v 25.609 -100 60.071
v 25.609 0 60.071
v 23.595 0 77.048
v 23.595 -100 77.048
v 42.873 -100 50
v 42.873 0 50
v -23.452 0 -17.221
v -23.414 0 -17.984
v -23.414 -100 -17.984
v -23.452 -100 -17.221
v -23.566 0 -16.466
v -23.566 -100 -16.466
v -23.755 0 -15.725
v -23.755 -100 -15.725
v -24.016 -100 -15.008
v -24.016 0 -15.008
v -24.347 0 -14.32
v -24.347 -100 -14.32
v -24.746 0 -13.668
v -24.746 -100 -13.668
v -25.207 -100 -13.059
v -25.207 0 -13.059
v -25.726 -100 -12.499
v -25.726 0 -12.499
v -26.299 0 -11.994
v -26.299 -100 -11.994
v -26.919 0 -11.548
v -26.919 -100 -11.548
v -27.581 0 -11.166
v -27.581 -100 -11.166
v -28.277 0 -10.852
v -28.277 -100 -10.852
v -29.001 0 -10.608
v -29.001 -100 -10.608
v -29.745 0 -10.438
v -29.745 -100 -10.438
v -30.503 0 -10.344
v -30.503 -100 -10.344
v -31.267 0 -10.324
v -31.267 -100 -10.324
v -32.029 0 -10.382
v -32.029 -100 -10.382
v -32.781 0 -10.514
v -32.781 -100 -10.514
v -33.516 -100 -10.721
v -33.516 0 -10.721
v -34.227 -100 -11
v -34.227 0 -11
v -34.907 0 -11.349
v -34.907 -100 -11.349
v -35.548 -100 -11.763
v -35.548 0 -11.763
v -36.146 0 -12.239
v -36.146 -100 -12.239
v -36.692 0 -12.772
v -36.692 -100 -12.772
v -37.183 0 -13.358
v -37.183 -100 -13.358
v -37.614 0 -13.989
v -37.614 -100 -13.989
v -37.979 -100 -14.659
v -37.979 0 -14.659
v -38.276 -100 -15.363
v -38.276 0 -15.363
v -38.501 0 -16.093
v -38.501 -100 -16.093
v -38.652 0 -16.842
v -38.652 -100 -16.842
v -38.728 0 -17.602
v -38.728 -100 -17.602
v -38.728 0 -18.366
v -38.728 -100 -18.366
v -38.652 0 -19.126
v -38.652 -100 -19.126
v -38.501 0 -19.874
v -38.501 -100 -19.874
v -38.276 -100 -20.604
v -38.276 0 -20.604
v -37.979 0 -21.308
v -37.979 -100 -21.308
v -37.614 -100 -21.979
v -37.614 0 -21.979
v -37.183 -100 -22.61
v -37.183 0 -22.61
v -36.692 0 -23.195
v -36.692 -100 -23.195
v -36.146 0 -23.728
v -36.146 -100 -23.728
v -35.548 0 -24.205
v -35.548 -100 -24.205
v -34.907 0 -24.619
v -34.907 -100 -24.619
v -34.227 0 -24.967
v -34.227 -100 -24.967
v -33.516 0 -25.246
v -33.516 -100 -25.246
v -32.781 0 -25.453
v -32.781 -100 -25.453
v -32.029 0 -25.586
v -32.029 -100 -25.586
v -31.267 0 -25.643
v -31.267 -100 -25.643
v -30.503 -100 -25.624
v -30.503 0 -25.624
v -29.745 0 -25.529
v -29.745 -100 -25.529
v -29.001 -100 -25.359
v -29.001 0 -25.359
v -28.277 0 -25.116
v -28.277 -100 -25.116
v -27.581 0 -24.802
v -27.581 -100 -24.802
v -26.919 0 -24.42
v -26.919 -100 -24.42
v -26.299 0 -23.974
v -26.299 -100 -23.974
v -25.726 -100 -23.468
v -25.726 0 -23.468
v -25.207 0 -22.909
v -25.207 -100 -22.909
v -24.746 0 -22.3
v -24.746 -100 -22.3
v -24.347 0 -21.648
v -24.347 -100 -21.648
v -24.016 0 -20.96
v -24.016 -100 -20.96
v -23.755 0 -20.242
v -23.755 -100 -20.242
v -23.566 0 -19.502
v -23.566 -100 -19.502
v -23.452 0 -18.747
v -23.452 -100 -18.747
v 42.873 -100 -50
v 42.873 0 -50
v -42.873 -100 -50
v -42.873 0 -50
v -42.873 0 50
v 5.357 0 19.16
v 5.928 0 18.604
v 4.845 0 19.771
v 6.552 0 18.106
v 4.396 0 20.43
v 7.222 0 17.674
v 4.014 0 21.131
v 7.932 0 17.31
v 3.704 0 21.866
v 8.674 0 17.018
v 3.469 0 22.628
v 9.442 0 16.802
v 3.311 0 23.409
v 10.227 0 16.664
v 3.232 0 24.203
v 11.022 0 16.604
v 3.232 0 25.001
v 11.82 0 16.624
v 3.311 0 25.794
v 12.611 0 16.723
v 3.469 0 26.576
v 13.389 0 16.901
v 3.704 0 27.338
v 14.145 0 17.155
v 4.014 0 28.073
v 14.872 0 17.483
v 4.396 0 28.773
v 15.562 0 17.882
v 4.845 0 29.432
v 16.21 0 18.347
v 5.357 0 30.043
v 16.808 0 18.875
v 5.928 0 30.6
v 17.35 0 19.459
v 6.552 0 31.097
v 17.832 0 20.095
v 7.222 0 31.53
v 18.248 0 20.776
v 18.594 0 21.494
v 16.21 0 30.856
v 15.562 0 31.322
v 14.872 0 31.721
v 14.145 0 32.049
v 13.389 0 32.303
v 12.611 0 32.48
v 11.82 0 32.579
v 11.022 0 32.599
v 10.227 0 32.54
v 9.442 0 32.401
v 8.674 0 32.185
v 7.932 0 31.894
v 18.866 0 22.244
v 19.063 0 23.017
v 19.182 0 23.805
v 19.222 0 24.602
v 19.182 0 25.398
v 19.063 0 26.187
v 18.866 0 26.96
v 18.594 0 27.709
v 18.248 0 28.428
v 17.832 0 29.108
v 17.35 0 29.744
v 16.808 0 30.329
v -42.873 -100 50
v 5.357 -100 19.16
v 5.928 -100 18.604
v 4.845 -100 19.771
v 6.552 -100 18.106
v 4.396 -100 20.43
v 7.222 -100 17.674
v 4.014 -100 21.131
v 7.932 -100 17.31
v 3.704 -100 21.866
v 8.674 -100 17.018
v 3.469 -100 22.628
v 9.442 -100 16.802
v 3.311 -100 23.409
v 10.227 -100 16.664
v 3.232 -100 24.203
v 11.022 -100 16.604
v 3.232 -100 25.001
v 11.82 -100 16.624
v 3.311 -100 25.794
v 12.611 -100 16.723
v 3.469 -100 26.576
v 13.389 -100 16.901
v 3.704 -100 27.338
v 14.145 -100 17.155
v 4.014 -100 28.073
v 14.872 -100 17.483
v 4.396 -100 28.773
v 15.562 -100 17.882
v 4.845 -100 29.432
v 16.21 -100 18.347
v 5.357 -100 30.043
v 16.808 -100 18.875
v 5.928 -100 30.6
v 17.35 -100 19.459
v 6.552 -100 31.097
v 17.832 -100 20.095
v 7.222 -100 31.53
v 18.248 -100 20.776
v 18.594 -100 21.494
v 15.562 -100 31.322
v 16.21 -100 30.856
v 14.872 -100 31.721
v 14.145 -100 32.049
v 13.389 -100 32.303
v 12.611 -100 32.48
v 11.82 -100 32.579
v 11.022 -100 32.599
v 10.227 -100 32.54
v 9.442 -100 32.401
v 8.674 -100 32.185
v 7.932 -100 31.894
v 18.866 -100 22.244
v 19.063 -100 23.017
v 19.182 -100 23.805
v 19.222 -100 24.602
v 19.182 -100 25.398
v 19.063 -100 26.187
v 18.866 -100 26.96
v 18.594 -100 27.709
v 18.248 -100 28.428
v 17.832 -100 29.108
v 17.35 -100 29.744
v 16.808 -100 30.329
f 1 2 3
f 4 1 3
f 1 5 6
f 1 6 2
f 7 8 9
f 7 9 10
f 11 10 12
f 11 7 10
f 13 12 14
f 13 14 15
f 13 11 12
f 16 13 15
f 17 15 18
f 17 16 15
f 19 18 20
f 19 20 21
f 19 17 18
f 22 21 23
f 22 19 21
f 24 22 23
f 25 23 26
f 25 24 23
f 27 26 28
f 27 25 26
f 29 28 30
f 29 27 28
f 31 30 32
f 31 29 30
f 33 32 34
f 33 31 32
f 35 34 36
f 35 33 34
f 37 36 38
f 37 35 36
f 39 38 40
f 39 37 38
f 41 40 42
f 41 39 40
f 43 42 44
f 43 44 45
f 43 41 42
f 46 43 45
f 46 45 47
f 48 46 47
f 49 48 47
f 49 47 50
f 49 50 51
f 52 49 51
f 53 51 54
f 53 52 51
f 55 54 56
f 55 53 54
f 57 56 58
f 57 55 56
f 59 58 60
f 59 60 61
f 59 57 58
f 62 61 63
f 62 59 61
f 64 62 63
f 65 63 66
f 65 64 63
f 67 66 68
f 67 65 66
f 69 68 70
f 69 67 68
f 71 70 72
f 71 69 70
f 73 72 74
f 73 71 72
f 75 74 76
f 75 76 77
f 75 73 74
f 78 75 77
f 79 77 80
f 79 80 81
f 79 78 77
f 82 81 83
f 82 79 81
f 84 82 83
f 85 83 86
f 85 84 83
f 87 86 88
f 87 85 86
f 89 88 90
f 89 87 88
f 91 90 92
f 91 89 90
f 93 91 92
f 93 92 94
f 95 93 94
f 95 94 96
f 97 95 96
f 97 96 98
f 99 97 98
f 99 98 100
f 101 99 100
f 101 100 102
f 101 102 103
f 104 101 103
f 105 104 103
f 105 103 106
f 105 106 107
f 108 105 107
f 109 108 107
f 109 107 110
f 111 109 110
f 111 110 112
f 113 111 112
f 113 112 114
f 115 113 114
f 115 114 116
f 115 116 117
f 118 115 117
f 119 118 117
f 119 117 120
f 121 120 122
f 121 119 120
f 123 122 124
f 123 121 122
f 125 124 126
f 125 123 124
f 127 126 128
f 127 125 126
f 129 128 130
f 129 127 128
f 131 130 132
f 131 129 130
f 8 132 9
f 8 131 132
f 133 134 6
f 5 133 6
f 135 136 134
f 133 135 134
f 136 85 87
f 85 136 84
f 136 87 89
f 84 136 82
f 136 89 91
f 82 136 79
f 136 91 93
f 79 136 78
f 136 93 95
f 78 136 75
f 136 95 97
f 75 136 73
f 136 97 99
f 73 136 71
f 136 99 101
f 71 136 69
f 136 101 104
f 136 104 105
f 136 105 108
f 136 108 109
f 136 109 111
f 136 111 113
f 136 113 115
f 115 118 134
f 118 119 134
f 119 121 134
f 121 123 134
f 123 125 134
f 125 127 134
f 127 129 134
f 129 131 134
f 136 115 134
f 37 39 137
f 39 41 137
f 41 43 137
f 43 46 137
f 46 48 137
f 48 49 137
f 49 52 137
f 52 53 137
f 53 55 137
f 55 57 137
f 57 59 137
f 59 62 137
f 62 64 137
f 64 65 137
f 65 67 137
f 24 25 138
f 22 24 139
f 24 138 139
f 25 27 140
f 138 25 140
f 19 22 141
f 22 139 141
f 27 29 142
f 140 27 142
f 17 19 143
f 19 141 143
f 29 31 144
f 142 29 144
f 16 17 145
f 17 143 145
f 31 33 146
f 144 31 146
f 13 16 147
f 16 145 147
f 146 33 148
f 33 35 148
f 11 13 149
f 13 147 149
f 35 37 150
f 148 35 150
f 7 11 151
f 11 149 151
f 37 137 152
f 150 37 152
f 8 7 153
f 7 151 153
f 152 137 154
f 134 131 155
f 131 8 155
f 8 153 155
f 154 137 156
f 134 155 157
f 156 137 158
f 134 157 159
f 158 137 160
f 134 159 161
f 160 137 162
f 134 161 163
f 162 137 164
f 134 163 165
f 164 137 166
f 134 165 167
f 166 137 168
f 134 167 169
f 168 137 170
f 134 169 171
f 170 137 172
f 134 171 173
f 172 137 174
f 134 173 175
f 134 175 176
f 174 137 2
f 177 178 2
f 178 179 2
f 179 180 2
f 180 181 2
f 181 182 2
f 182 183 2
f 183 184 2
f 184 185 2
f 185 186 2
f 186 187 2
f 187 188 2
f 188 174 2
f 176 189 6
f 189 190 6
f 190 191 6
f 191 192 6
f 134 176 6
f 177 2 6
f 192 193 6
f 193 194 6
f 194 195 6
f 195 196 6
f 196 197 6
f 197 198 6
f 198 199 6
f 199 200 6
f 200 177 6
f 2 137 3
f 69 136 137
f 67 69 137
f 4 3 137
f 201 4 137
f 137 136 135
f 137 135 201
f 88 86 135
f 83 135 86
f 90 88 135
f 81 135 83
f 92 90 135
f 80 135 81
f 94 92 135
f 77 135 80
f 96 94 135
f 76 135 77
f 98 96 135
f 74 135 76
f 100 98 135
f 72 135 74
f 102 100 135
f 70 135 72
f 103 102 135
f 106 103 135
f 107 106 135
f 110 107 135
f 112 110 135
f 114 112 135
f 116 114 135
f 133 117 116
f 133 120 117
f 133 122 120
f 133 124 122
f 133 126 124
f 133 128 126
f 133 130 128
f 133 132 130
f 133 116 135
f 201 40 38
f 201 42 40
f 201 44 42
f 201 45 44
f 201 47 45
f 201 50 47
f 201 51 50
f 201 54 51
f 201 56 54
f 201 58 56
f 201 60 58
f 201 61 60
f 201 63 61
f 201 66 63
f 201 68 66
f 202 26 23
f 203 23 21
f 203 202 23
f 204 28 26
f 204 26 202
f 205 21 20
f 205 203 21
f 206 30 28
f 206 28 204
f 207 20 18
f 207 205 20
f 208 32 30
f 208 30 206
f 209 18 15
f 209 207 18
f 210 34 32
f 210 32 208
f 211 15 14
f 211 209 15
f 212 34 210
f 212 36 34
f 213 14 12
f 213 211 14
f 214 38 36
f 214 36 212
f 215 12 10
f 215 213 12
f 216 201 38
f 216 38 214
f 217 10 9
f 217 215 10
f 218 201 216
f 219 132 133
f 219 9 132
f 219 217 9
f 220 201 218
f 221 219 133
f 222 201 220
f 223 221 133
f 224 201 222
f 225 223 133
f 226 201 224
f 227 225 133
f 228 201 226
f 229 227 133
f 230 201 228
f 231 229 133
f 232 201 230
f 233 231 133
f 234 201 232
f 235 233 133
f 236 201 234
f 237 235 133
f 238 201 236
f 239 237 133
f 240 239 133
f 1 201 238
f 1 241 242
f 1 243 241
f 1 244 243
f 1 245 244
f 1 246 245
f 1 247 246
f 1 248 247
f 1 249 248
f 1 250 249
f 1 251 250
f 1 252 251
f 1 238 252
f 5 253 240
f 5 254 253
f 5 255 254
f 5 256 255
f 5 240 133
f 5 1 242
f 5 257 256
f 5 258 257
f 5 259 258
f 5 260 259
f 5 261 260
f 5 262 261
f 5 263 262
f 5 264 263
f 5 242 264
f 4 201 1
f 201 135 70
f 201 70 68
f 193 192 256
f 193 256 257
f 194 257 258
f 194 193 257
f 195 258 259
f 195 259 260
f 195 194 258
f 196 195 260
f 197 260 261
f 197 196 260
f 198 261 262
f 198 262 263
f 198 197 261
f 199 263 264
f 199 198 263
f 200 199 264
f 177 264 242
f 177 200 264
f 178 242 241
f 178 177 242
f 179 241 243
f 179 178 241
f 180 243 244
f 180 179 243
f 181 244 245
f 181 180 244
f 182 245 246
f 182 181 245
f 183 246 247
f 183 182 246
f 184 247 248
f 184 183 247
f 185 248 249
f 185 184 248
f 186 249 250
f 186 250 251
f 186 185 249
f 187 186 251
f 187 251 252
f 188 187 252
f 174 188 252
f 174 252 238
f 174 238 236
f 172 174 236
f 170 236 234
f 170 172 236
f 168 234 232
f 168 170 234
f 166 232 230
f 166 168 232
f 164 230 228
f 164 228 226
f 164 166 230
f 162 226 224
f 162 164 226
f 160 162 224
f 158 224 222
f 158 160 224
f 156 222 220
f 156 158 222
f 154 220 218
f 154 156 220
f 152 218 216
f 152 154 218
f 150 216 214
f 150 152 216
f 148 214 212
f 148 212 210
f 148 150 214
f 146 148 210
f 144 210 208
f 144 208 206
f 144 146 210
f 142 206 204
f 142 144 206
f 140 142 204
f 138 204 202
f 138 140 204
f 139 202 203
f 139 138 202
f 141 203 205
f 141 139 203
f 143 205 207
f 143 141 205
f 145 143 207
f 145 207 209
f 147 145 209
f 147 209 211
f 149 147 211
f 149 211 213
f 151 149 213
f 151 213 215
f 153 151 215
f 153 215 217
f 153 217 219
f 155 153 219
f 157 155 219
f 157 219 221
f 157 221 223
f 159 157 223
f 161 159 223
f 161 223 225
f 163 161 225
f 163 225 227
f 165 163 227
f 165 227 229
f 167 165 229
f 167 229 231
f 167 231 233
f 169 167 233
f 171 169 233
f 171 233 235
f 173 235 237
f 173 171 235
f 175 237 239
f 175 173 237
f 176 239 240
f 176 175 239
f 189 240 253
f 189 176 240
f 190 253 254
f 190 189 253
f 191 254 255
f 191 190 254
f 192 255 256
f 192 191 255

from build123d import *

# Parameters (mm, degrees)
F0_W     = 85.746526
F0_H     = 100
F0_R     = 7.66167
F0_R_2   = 8
F1_DEPTH = 100


with BuildPart() as f1:
    # F0 (on Front) → F1 (new body)
    with BuildSketch(Plane.XZ):
        Rectangle(F0_W, F0_H)
        with Locations((-31.075926, -17.983756)):
            Circle(F0_R, mode=Mode.SUBTRACT)
        with Locations((11.22186, 24.60177)):
            Circle(F0_R_2, mode=Mode.SUBTRACT)
        Polygon((-42.873263, 50), (42.873263, 50), (25.608866, 60.070896), (23.594683, 77.047562), align=None)
    extrude(amount=F1_DEPTH)


solid = f1.part
